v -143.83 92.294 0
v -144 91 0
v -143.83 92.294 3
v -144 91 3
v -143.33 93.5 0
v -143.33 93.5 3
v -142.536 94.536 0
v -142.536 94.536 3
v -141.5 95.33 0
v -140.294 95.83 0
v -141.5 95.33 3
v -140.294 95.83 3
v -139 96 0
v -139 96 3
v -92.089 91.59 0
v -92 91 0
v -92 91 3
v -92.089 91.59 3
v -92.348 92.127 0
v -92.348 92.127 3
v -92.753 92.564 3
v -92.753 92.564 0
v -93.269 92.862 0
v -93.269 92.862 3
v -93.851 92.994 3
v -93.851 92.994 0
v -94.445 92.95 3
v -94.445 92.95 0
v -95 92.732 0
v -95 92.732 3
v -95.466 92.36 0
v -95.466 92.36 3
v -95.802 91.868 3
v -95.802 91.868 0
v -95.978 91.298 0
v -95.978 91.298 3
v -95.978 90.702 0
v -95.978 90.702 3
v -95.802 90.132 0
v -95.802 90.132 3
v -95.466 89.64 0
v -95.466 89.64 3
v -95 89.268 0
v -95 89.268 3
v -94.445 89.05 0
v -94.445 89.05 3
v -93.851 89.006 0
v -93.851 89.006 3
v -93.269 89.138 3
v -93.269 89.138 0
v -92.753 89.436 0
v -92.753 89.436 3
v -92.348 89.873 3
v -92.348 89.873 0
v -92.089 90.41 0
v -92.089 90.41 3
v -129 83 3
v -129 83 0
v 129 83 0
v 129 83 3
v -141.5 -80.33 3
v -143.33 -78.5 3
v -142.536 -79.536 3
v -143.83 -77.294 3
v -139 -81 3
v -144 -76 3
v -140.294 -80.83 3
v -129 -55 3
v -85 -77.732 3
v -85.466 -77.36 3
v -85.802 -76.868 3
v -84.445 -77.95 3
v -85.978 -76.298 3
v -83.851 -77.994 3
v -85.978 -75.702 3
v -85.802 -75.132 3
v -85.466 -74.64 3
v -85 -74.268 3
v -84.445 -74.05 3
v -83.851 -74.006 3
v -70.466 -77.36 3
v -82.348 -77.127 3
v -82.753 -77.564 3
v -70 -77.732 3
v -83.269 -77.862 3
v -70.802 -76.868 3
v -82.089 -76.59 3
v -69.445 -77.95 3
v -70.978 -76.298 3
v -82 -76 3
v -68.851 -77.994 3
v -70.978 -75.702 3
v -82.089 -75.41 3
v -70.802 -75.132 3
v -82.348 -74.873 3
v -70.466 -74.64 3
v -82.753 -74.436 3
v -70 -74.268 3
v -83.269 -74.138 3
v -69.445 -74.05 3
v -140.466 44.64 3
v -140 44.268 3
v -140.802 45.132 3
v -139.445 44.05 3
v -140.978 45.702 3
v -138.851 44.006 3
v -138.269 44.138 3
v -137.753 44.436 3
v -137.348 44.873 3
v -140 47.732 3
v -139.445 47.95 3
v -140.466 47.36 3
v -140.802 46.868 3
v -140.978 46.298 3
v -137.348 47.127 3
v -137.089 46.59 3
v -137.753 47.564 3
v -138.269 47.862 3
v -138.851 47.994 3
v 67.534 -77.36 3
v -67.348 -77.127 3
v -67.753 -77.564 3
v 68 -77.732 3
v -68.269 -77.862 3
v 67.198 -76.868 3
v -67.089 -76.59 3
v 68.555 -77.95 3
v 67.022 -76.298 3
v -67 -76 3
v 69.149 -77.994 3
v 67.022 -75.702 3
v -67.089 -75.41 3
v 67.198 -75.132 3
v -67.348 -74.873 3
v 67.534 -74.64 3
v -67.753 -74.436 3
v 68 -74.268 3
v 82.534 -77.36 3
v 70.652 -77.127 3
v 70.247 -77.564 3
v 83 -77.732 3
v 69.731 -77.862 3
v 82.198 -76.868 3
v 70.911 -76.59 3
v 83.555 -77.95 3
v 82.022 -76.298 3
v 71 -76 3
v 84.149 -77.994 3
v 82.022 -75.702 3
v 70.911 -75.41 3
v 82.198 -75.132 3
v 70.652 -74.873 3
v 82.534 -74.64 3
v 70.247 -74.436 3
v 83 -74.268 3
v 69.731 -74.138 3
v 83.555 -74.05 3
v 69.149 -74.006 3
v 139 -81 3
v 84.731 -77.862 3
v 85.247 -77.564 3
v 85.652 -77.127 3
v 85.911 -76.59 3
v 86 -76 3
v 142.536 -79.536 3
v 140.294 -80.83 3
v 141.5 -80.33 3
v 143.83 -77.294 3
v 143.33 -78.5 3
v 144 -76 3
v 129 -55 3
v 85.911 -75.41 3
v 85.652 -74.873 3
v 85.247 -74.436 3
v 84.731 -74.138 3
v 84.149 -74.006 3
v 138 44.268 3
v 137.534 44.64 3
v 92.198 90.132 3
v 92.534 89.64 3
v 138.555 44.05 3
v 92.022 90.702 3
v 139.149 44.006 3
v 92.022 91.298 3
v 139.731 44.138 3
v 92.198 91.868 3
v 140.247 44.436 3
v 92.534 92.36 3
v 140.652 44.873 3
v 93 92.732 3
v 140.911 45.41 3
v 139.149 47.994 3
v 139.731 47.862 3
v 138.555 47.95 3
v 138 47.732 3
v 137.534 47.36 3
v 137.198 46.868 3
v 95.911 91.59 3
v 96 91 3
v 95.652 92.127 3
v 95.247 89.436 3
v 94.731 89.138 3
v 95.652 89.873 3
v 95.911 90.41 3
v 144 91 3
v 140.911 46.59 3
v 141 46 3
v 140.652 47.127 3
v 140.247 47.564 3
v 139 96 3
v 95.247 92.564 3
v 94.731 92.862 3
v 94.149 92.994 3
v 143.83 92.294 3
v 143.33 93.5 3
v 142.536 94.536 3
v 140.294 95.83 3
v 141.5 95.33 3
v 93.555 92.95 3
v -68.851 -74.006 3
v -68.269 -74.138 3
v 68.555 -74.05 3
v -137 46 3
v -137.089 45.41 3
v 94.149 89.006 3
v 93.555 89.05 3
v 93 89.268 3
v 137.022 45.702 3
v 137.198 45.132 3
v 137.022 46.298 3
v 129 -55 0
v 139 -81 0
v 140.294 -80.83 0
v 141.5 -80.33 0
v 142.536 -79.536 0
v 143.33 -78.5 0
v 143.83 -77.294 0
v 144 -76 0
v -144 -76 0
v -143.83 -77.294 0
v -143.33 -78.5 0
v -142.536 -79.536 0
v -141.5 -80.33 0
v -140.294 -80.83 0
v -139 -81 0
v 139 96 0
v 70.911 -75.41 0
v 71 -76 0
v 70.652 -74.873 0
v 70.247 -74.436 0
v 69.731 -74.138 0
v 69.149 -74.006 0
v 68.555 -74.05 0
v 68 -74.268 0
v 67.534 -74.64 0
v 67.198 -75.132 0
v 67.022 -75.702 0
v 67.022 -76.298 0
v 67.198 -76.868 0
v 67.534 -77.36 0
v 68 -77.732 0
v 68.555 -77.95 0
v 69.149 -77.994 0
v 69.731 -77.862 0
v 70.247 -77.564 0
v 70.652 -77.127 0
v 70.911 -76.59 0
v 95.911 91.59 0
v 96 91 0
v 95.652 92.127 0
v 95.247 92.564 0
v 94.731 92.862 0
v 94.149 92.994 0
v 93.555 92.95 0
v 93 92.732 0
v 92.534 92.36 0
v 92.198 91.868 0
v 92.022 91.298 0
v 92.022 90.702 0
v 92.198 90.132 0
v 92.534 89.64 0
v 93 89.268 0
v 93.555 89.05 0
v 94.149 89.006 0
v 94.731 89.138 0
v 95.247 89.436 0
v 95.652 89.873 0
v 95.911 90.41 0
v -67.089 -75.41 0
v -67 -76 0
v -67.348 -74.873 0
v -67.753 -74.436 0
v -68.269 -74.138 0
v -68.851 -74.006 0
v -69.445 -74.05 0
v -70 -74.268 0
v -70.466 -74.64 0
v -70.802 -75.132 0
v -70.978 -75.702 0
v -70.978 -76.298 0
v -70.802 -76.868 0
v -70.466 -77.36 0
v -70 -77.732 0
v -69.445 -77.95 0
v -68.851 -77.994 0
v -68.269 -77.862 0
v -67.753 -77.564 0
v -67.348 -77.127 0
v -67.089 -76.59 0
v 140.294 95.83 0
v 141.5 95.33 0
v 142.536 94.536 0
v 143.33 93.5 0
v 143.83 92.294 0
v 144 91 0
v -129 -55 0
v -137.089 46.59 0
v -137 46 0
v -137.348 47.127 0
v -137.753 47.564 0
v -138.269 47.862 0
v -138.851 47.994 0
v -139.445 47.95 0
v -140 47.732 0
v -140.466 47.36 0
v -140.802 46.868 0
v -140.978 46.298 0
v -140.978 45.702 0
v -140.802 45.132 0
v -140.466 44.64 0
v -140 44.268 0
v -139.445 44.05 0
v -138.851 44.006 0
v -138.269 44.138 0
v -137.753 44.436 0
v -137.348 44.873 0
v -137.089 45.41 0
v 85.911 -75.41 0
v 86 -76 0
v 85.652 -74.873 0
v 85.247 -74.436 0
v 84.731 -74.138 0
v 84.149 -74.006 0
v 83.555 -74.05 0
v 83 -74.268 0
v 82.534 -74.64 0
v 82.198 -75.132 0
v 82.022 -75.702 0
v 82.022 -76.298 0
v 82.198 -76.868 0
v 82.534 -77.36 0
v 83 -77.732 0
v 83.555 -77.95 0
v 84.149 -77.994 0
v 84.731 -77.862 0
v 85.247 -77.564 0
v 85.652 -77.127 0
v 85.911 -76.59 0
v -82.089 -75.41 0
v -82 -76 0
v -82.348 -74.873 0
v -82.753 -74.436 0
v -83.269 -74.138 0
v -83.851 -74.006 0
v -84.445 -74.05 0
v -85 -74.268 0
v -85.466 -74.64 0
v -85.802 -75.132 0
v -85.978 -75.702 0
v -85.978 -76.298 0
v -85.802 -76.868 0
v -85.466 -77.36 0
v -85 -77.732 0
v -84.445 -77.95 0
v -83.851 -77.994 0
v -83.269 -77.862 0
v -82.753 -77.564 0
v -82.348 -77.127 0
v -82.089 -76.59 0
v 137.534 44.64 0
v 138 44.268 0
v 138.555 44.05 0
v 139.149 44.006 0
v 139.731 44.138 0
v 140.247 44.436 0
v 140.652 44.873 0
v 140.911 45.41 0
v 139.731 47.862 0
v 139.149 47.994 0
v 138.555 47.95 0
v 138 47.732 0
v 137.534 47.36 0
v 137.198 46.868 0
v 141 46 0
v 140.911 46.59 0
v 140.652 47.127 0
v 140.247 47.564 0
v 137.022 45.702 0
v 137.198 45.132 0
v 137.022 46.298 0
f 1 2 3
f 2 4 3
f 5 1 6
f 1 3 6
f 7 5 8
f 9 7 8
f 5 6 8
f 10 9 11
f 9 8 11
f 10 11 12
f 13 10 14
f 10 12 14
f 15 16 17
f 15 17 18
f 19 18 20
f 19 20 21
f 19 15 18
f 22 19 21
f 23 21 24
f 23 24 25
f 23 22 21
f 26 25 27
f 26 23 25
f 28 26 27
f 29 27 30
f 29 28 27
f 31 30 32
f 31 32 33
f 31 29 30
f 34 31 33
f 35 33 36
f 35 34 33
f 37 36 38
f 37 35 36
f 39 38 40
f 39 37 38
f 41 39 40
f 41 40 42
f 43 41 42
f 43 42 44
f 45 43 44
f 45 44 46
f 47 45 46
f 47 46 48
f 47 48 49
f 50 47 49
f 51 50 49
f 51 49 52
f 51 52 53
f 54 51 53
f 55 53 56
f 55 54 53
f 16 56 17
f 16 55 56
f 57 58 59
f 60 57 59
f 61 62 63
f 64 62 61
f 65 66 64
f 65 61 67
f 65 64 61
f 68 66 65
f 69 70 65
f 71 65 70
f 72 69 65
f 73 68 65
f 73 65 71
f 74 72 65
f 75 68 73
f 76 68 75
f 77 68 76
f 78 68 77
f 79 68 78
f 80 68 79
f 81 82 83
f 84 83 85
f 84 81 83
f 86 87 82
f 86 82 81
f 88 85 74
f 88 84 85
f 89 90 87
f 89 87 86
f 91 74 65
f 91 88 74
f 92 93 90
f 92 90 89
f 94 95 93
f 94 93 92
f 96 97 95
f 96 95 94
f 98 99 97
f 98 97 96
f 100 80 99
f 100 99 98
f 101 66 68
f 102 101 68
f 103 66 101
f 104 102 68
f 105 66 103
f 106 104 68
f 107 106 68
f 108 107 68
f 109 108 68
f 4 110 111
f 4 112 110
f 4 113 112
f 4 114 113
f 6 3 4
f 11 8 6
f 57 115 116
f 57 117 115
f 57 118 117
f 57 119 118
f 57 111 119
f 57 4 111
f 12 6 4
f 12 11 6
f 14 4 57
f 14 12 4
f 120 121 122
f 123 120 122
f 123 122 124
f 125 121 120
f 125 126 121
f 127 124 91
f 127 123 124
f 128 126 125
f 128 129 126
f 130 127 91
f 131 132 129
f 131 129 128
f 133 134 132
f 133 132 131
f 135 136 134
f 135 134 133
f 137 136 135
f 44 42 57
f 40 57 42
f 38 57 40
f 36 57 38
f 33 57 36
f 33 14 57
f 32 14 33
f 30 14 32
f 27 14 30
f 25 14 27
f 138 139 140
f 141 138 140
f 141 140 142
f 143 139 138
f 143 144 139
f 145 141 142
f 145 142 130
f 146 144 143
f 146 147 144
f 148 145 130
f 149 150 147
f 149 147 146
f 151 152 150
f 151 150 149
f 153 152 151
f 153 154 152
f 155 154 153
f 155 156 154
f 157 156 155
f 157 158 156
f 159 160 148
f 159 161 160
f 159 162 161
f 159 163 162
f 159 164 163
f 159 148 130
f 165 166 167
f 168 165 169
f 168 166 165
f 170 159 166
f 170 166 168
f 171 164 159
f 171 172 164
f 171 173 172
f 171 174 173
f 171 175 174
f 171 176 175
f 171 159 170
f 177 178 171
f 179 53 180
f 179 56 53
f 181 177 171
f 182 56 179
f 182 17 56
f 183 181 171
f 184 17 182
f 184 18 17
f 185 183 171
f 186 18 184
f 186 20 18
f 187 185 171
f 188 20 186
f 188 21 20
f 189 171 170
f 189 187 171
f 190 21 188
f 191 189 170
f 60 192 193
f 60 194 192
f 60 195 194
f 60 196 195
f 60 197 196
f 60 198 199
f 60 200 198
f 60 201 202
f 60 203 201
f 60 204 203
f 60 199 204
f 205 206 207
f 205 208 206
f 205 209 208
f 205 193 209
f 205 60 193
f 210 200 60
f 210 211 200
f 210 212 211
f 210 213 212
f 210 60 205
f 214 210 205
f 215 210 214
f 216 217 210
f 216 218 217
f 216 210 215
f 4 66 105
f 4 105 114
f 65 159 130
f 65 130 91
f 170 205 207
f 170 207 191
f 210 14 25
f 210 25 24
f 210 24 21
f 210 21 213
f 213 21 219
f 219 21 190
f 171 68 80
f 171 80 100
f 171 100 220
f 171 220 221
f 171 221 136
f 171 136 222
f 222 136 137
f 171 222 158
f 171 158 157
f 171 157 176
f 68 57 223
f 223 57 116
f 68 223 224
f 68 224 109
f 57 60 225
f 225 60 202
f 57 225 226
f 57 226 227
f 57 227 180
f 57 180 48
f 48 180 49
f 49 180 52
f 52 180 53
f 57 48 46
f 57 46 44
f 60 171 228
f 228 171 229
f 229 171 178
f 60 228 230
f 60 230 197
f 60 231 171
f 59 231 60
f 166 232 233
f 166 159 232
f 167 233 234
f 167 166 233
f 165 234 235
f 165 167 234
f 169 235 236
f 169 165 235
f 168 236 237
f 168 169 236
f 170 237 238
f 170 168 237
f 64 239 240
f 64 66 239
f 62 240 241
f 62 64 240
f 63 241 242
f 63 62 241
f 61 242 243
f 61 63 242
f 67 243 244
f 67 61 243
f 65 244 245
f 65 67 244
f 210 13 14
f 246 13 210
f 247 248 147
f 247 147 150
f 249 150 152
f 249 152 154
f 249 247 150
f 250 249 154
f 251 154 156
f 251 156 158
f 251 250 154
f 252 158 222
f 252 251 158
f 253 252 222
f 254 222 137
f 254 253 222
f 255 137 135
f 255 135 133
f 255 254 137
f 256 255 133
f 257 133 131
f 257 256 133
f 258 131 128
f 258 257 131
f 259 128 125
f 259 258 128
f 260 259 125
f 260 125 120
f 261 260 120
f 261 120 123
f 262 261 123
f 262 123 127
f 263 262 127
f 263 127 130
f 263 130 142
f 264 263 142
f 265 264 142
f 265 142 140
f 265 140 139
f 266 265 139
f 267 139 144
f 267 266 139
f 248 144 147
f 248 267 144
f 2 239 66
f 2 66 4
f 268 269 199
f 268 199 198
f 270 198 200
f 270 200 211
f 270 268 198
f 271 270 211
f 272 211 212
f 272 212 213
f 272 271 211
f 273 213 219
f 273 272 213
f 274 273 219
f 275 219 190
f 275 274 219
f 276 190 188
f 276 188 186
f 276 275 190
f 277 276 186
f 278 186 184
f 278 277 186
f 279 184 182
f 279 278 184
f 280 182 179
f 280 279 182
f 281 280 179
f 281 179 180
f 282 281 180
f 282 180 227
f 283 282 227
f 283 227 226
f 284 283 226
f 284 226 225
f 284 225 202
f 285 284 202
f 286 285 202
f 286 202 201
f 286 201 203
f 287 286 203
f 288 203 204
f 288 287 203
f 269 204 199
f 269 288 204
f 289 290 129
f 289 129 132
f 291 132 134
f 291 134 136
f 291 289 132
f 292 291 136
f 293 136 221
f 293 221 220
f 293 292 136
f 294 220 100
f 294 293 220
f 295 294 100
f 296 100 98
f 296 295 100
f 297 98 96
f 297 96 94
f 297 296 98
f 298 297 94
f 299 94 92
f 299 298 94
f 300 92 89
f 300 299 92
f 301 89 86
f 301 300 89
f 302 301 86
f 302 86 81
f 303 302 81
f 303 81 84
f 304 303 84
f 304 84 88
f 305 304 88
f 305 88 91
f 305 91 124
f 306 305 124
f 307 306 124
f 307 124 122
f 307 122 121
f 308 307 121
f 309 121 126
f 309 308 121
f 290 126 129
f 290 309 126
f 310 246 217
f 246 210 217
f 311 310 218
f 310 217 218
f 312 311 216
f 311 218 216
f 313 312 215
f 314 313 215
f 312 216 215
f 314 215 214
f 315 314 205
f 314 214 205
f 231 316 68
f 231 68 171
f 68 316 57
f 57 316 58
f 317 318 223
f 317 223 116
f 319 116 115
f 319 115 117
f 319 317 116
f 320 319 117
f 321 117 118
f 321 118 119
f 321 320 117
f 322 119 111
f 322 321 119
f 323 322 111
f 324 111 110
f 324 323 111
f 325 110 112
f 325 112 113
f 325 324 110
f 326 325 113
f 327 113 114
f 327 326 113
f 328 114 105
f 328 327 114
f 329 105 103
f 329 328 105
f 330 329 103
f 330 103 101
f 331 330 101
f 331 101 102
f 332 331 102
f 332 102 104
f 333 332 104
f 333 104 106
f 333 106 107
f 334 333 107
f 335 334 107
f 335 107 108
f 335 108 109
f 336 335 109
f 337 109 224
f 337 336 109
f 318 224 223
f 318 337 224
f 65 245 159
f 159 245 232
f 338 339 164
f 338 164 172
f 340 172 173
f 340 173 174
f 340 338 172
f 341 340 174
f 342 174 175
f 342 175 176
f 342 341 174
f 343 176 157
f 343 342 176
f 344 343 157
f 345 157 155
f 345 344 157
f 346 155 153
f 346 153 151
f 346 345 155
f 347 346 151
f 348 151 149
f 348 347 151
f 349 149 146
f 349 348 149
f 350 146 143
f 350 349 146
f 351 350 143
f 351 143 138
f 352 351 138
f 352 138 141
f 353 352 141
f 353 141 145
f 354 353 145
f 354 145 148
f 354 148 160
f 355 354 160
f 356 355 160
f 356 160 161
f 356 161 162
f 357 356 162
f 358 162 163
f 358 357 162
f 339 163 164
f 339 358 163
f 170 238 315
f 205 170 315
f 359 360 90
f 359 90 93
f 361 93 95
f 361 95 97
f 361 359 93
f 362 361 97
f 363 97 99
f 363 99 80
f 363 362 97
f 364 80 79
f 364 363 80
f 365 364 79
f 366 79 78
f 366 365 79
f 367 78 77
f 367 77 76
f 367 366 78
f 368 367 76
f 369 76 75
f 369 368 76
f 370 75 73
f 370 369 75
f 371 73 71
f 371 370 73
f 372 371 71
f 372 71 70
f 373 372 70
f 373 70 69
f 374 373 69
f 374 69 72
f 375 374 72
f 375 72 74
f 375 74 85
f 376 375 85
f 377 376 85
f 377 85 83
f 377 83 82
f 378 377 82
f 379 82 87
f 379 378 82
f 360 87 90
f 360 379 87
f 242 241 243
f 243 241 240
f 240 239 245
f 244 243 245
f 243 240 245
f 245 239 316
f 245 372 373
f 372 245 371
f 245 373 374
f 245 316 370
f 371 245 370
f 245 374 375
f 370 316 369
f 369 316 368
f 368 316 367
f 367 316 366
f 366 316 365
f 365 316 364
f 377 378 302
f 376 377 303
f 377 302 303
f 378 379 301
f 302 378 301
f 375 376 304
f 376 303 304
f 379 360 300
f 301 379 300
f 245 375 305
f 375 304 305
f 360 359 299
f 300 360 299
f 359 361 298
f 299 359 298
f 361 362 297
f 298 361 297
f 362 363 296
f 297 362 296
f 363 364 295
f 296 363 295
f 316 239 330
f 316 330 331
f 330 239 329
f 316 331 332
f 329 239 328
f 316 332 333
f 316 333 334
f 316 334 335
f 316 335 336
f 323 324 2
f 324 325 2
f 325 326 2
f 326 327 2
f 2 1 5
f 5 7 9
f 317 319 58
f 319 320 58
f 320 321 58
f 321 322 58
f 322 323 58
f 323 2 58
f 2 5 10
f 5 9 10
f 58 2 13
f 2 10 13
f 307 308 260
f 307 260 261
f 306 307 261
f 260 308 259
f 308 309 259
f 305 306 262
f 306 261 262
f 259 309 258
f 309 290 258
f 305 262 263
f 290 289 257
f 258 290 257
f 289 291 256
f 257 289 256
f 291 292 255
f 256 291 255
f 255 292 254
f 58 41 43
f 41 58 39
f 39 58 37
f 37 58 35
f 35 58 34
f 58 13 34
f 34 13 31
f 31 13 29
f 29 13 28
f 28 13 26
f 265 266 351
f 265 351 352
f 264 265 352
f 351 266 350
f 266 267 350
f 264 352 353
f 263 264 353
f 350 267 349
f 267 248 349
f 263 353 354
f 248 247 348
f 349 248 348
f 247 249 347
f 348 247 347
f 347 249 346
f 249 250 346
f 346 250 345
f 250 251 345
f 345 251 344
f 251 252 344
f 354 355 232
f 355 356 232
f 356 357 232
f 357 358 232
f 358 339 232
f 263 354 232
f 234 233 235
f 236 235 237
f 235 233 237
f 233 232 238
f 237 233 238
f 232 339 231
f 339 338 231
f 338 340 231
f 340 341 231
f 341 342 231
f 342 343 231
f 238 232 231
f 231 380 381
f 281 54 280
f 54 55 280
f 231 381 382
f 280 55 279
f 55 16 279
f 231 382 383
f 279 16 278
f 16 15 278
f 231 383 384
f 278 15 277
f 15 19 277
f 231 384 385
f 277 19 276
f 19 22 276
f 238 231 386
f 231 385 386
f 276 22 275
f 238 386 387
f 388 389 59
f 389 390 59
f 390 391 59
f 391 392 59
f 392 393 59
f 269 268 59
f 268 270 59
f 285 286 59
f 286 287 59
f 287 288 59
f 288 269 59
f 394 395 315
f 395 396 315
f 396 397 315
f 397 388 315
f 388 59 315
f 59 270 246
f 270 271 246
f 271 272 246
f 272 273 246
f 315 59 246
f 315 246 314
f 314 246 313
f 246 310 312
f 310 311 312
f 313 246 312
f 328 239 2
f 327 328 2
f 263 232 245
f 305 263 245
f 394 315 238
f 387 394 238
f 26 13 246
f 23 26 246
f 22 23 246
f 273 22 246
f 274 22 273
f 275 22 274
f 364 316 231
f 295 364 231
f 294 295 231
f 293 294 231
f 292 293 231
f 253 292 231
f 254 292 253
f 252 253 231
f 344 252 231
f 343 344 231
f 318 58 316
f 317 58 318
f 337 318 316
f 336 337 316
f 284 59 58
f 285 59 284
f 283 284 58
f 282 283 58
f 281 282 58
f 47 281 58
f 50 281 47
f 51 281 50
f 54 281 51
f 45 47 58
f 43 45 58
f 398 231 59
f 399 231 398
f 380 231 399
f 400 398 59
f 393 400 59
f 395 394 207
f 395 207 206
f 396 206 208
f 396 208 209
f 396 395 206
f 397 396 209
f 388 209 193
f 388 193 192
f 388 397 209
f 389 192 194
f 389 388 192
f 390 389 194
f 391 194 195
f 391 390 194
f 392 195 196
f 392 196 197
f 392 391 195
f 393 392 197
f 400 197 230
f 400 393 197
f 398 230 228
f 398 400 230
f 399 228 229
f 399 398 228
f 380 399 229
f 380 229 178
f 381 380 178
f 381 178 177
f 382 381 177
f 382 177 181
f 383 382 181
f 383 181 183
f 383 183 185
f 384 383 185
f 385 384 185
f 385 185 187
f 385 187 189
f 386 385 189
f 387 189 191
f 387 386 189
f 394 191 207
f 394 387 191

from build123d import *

# Parameters (mm, degrees)
F0_W     = 288
F0_H     = 177
F0_R     = 2
F0_W_2   = 258
F0_H_2   = 138
F1_DEPTH = 3
F2_R     = 5


with BuildPart() as f1:
    # F0 (on Top) → F1 (new body)
    with BuildSketch(Plane.XY):
        with Locations((0, 7.5)):
            Rectangle(F0_W, F0_H)
        with Locations((-84, -76)):
            Circle(F0_R, mode=Mode.SUBTRACT)
        with Locations((-69, -76)):
            Circle(F0_R, mode=Mode.SUBTRACT)
        with Locations((69, -76)):
            Circle(F0_R, mode=Mode.SUBTRACT)
        with Locations((84, -76)):
            Circle(F0_R, mode=Mode.SUBTRACT)
        with Locations((-139, 46)):
            Circle(F0_R, mode=Mode.SUBTRACT)
        with Locations((-94, 91)):
            Circle(F0_R, mode=Mode.SUBTRACT)
        with Locations((0, 14)):
            Rectangle(F0_W_2, F0_H_2, mode=Mode.SUBTRACT)
        with Locations((139, 46)):
            Circle(F0_R, mode=Mode.SUBTRACT)
        with Locations((94, 91)):
            Circle(F0_R, mode=Mode.SUBTRACT)
    extrude(amount=F1_DEPTH)

    # F2
    f2_edges = [f1.edges().sort_by_distance(p)[0] for p in [
        (-144, 96, 1.5),
        (-144, -81, 1.5),
        (144, -81, 1.5),
        (144, 96, 1.5),
    ]]
    fillet(f2_edges, radius=F2_R)


solid = f1.part
